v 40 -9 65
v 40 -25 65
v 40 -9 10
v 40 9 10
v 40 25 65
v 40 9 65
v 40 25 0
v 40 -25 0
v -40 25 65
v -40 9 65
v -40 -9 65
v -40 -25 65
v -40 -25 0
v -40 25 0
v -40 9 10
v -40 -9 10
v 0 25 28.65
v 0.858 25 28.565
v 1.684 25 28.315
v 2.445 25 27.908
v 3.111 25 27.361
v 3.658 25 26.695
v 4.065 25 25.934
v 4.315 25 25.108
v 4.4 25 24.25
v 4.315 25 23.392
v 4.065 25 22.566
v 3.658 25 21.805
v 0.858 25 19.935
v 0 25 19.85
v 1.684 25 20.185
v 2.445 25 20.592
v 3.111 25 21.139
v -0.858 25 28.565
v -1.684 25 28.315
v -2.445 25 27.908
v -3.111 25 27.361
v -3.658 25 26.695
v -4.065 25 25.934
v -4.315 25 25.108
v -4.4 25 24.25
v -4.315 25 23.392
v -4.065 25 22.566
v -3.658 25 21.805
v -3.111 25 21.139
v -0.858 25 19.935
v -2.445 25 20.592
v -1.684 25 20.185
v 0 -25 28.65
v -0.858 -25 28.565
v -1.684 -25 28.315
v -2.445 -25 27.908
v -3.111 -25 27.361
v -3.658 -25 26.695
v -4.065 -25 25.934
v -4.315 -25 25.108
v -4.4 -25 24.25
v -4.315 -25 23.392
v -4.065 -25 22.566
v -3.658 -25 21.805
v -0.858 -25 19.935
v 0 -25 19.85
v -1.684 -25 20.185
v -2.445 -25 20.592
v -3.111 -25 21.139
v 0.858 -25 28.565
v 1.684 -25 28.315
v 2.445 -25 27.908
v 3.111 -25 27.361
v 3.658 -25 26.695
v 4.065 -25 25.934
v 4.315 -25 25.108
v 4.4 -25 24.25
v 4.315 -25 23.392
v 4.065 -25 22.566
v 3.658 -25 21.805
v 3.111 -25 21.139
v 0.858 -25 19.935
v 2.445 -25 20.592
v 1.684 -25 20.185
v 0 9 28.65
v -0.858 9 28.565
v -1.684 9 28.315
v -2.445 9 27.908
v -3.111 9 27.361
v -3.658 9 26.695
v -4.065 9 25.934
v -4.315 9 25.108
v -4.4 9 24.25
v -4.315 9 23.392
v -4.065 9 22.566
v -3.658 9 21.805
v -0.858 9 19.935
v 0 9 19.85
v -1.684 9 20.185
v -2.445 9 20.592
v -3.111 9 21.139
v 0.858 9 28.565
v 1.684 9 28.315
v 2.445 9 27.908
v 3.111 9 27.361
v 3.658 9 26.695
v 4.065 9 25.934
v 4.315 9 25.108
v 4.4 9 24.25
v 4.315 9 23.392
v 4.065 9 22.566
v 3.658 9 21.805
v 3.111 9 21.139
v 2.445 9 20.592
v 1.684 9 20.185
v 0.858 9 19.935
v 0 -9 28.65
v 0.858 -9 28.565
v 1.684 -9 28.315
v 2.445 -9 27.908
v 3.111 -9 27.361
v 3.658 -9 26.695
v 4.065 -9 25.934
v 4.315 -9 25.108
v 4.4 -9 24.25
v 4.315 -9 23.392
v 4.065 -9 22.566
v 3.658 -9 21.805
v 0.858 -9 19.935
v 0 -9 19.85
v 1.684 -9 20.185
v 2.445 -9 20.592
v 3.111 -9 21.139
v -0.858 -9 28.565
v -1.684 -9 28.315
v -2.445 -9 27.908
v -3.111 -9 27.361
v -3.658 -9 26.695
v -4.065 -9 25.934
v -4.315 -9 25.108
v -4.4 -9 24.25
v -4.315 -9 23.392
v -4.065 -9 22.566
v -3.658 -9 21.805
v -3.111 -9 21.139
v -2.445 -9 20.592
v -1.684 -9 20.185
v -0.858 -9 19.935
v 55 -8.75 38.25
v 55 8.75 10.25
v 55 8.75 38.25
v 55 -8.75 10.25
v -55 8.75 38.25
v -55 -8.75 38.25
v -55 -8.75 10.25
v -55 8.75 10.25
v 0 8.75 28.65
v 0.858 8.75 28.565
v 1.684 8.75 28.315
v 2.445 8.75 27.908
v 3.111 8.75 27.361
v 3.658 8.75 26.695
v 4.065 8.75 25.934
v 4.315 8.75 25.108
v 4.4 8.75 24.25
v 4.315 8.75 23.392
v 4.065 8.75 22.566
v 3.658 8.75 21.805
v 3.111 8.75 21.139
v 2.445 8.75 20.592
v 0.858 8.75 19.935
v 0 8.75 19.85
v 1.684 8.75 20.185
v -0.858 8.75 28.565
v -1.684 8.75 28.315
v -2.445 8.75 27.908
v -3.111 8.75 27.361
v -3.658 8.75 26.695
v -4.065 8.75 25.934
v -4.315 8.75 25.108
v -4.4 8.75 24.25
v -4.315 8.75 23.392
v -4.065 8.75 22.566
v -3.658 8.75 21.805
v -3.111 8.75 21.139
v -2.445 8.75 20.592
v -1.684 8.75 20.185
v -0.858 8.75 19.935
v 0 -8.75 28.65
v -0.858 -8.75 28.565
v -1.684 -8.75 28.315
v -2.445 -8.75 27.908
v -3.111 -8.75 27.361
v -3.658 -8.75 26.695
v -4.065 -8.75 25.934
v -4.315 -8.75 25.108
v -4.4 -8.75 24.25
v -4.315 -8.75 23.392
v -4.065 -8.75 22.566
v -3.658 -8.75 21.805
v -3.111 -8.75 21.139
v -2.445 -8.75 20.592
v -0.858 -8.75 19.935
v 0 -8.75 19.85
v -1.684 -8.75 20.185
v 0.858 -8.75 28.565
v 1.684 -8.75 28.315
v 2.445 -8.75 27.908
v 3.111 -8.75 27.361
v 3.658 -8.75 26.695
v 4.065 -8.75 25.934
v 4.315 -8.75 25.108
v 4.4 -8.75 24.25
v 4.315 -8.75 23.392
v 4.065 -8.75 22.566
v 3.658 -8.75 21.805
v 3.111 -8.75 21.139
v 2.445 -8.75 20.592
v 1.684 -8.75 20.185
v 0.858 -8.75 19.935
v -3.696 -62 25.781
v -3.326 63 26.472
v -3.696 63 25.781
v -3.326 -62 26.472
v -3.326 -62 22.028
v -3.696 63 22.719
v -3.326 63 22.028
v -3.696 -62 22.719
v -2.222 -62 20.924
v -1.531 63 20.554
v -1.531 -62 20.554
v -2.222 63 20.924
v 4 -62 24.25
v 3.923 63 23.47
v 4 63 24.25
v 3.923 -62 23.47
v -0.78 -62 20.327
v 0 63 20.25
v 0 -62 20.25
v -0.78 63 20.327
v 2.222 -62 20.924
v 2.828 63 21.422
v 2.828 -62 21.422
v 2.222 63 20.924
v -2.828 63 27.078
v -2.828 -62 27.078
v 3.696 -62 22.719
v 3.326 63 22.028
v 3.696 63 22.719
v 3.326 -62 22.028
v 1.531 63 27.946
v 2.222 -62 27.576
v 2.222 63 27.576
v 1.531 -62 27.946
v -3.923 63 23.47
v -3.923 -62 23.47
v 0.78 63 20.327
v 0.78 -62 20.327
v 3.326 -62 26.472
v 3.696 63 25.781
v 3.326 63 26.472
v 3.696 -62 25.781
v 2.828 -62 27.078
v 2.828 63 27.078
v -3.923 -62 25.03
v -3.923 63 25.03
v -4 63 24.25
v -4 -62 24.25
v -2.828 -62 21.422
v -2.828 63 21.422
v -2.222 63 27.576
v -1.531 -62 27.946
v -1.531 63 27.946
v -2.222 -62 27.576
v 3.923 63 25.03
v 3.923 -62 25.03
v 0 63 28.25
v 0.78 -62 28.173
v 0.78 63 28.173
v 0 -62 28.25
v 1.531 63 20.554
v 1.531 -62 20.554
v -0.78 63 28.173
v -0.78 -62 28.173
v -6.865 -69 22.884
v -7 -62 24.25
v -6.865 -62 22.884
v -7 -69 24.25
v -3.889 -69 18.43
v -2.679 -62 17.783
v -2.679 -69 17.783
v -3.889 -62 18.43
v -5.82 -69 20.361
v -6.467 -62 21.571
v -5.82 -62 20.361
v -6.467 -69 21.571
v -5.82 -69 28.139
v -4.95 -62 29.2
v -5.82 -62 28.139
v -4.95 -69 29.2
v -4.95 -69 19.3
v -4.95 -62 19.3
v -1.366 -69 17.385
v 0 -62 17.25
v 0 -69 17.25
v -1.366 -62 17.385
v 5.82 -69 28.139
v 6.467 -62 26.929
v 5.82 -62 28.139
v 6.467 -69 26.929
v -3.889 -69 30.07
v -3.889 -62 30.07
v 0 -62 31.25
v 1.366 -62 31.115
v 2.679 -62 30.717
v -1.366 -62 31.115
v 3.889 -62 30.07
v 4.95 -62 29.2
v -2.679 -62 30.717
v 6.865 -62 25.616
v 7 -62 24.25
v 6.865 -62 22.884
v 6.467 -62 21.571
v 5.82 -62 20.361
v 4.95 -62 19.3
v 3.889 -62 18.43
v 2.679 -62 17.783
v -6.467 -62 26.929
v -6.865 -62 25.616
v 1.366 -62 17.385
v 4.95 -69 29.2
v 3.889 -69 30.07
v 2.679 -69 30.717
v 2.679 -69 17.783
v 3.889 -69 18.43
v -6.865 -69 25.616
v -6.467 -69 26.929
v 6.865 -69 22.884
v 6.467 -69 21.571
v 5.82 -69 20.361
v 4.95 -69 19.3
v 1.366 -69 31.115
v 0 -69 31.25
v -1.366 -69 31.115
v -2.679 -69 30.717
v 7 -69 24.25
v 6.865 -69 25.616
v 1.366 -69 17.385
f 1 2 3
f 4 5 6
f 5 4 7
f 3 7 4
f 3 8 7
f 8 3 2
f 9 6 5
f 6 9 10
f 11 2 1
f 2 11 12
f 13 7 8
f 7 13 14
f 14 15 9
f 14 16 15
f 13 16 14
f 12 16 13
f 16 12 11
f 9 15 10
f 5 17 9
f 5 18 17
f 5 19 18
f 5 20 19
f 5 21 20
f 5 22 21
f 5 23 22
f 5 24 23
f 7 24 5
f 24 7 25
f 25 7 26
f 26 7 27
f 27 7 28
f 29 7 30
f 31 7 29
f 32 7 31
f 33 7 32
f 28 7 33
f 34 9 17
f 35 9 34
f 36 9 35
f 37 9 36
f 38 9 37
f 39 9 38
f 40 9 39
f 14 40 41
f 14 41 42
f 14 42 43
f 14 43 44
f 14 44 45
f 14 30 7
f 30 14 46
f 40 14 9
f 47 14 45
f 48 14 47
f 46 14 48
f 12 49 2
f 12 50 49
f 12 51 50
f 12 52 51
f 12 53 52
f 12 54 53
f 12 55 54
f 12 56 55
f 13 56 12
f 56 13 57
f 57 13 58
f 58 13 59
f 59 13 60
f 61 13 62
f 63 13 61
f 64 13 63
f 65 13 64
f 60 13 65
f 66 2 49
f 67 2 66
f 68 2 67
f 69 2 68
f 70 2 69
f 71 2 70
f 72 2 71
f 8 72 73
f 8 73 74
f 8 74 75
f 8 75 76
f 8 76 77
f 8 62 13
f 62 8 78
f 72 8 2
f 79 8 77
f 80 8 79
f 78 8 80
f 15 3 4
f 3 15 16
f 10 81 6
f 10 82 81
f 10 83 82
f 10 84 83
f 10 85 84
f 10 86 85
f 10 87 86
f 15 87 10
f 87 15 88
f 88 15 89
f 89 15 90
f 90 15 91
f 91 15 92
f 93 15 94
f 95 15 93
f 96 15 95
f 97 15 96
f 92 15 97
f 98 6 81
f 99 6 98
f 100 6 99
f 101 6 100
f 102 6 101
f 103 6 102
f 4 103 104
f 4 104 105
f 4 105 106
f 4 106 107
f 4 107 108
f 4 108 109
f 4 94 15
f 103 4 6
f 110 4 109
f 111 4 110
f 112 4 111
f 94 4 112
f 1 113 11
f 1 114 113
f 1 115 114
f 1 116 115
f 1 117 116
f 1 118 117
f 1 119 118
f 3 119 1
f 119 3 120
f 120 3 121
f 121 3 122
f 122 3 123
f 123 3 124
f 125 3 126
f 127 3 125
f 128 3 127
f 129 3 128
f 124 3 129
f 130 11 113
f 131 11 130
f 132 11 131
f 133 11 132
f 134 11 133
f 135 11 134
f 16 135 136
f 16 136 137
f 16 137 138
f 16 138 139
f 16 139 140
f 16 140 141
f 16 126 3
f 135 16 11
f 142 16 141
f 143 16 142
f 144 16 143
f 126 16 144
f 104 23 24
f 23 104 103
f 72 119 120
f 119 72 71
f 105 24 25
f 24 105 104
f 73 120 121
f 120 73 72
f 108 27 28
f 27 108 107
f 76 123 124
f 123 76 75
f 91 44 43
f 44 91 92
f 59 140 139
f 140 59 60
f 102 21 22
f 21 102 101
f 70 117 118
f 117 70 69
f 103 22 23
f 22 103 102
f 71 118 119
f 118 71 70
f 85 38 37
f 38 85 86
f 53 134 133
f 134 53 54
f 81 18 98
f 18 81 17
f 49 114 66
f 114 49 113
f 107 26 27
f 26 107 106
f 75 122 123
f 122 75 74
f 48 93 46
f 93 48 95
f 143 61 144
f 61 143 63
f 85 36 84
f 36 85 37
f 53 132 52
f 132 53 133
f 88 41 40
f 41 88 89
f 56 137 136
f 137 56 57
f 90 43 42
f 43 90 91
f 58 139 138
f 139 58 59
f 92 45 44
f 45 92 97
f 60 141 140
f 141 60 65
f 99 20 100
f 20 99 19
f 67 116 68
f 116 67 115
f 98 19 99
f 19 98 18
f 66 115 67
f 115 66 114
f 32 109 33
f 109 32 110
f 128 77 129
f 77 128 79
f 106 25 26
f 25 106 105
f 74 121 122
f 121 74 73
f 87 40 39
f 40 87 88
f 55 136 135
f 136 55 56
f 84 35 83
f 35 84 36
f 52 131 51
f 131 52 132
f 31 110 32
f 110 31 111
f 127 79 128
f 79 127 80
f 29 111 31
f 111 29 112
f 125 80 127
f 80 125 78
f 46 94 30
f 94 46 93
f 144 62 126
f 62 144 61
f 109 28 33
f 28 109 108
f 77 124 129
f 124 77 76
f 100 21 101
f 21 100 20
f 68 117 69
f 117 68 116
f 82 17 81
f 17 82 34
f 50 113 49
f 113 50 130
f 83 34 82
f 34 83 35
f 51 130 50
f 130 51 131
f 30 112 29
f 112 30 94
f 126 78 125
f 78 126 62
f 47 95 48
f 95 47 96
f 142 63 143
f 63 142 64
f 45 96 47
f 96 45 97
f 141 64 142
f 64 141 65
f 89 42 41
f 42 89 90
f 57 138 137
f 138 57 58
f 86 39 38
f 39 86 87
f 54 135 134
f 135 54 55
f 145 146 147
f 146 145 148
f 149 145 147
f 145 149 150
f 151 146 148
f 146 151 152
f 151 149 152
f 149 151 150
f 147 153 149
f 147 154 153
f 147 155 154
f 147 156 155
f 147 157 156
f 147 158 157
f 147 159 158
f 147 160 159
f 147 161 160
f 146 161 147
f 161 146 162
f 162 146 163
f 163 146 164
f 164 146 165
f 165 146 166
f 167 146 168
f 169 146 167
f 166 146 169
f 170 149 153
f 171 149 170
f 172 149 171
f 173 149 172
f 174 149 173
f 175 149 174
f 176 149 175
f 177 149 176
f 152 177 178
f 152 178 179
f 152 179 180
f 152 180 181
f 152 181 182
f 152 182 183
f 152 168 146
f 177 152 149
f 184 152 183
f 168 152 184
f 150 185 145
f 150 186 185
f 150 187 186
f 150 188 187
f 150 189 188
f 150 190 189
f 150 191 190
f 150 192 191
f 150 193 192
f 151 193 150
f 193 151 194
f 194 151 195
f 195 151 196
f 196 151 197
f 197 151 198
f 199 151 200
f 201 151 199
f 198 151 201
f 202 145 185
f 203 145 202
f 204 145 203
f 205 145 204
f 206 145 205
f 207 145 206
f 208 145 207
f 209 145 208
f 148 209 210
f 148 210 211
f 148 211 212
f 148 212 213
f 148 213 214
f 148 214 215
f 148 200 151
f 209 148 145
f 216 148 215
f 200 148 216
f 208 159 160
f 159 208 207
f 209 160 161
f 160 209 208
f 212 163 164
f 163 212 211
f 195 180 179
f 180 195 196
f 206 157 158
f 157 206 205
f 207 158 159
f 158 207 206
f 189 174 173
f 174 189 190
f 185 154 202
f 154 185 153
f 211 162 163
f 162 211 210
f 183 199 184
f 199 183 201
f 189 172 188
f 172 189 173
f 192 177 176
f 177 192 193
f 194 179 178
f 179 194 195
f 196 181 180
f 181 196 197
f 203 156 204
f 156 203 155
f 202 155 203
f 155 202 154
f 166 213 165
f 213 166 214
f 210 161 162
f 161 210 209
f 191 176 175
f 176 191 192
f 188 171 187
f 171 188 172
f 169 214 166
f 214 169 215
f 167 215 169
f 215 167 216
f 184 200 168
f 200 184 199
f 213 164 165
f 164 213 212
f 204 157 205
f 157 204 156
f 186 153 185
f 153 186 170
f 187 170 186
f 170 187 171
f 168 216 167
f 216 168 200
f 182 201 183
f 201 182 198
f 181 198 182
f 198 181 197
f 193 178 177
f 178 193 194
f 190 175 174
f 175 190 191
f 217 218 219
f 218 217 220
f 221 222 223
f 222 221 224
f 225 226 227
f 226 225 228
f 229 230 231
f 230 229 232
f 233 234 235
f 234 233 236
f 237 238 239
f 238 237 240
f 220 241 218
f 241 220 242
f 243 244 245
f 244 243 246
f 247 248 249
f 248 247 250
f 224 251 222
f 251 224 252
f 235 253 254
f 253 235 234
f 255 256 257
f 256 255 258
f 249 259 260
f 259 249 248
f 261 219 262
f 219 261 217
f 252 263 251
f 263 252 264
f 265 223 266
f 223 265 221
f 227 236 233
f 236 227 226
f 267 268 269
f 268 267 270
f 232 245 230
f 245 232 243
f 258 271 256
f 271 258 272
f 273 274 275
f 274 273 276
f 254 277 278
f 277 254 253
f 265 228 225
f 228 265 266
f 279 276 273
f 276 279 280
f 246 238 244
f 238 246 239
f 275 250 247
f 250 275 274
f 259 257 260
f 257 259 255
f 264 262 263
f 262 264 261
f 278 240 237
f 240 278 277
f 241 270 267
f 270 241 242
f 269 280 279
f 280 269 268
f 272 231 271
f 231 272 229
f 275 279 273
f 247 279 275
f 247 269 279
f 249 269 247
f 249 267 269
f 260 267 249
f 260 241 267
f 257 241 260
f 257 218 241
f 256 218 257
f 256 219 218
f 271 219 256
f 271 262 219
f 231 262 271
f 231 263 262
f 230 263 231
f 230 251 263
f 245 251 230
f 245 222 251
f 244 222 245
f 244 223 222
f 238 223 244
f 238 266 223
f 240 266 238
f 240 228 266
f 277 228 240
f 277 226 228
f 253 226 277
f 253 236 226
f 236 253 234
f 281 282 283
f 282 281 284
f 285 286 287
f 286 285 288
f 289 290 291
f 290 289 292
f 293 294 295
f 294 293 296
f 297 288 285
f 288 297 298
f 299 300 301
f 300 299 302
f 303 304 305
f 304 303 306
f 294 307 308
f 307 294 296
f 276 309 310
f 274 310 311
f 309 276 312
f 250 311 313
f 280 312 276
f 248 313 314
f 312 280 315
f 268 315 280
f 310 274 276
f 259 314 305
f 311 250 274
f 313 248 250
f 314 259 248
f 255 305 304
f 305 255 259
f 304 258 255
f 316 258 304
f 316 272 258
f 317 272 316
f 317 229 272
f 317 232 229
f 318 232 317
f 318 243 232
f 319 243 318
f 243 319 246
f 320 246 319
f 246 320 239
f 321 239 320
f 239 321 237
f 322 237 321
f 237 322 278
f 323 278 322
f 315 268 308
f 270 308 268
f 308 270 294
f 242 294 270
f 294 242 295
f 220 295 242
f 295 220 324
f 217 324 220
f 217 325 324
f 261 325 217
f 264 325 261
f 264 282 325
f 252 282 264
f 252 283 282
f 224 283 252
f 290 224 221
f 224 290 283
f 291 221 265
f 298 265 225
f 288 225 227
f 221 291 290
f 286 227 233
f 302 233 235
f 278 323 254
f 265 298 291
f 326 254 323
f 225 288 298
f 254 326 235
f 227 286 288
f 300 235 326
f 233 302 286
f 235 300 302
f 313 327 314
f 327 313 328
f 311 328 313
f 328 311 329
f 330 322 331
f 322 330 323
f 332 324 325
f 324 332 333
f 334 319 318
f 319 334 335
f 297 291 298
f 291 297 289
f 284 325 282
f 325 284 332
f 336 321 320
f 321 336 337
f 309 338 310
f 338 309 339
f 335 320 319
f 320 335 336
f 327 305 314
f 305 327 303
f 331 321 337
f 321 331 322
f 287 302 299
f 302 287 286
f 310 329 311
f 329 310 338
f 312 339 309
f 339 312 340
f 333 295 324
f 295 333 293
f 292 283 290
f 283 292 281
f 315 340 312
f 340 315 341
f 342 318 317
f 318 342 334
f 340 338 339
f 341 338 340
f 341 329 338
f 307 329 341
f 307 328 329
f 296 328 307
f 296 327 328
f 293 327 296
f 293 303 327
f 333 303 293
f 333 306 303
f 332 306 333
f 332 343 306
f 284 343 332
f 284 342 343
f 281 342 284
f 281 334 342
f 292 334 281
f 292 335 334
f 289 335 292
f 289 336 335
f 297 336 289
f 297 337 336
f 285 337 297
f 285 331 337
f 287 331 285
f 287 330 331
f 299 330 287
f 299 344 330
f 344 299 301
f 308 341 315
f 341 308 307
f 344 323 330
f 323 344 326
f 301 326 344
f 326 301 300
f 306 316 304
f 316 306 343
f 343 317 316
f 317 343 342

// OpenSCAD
$fn = 32;

// ------------------------------------------------------------------------
// Clevis joint: 80 mm clevis, pin d8
// Every part is its own module, assembly() places them once.
// ------------------------------------------------------------------------

// --- part 1 ---
module clevis() {
  difference() {
    translate([-40, -25, 0]) cube([80, 50, 65]);
    translate([-41, -9, 10]) cube([82, 18, 56]);
    translate([0, 0, 24.25]) rotate([90, 0, 0]) cylinder(h = 52, d = 8.8, center = true);
  }
}

// --- part 2 ---
module eye() {
  difference() {
    translate([-55, -8.75, 0]) cube([110, 17.5, 28]);
    translate([0, 0, 14]) rotate([90, 0, 0]) cylinder(h = 19.5, d = 8.8, center = true);
  }
}

// --- part 3 ---
module pin() {
  rotate([0, 90, 0]) cylinder(h = 126, d = 8, center = true);
  translate([-69, 0, 0]) rotate([0, 90, 0]) cylinder(h = 7, d = 14);
}

// --- assembly ---
module assembly() {
  translate([0, 0, 0]) rotate([0, 0, 0]) clevis();
  translate([0, 0, 10.25]) rotate([0, 0, 0]) eye();
  translate([0, 0, 24.25]) rotate([0, 0, 90]) pin();
}

assembly();
